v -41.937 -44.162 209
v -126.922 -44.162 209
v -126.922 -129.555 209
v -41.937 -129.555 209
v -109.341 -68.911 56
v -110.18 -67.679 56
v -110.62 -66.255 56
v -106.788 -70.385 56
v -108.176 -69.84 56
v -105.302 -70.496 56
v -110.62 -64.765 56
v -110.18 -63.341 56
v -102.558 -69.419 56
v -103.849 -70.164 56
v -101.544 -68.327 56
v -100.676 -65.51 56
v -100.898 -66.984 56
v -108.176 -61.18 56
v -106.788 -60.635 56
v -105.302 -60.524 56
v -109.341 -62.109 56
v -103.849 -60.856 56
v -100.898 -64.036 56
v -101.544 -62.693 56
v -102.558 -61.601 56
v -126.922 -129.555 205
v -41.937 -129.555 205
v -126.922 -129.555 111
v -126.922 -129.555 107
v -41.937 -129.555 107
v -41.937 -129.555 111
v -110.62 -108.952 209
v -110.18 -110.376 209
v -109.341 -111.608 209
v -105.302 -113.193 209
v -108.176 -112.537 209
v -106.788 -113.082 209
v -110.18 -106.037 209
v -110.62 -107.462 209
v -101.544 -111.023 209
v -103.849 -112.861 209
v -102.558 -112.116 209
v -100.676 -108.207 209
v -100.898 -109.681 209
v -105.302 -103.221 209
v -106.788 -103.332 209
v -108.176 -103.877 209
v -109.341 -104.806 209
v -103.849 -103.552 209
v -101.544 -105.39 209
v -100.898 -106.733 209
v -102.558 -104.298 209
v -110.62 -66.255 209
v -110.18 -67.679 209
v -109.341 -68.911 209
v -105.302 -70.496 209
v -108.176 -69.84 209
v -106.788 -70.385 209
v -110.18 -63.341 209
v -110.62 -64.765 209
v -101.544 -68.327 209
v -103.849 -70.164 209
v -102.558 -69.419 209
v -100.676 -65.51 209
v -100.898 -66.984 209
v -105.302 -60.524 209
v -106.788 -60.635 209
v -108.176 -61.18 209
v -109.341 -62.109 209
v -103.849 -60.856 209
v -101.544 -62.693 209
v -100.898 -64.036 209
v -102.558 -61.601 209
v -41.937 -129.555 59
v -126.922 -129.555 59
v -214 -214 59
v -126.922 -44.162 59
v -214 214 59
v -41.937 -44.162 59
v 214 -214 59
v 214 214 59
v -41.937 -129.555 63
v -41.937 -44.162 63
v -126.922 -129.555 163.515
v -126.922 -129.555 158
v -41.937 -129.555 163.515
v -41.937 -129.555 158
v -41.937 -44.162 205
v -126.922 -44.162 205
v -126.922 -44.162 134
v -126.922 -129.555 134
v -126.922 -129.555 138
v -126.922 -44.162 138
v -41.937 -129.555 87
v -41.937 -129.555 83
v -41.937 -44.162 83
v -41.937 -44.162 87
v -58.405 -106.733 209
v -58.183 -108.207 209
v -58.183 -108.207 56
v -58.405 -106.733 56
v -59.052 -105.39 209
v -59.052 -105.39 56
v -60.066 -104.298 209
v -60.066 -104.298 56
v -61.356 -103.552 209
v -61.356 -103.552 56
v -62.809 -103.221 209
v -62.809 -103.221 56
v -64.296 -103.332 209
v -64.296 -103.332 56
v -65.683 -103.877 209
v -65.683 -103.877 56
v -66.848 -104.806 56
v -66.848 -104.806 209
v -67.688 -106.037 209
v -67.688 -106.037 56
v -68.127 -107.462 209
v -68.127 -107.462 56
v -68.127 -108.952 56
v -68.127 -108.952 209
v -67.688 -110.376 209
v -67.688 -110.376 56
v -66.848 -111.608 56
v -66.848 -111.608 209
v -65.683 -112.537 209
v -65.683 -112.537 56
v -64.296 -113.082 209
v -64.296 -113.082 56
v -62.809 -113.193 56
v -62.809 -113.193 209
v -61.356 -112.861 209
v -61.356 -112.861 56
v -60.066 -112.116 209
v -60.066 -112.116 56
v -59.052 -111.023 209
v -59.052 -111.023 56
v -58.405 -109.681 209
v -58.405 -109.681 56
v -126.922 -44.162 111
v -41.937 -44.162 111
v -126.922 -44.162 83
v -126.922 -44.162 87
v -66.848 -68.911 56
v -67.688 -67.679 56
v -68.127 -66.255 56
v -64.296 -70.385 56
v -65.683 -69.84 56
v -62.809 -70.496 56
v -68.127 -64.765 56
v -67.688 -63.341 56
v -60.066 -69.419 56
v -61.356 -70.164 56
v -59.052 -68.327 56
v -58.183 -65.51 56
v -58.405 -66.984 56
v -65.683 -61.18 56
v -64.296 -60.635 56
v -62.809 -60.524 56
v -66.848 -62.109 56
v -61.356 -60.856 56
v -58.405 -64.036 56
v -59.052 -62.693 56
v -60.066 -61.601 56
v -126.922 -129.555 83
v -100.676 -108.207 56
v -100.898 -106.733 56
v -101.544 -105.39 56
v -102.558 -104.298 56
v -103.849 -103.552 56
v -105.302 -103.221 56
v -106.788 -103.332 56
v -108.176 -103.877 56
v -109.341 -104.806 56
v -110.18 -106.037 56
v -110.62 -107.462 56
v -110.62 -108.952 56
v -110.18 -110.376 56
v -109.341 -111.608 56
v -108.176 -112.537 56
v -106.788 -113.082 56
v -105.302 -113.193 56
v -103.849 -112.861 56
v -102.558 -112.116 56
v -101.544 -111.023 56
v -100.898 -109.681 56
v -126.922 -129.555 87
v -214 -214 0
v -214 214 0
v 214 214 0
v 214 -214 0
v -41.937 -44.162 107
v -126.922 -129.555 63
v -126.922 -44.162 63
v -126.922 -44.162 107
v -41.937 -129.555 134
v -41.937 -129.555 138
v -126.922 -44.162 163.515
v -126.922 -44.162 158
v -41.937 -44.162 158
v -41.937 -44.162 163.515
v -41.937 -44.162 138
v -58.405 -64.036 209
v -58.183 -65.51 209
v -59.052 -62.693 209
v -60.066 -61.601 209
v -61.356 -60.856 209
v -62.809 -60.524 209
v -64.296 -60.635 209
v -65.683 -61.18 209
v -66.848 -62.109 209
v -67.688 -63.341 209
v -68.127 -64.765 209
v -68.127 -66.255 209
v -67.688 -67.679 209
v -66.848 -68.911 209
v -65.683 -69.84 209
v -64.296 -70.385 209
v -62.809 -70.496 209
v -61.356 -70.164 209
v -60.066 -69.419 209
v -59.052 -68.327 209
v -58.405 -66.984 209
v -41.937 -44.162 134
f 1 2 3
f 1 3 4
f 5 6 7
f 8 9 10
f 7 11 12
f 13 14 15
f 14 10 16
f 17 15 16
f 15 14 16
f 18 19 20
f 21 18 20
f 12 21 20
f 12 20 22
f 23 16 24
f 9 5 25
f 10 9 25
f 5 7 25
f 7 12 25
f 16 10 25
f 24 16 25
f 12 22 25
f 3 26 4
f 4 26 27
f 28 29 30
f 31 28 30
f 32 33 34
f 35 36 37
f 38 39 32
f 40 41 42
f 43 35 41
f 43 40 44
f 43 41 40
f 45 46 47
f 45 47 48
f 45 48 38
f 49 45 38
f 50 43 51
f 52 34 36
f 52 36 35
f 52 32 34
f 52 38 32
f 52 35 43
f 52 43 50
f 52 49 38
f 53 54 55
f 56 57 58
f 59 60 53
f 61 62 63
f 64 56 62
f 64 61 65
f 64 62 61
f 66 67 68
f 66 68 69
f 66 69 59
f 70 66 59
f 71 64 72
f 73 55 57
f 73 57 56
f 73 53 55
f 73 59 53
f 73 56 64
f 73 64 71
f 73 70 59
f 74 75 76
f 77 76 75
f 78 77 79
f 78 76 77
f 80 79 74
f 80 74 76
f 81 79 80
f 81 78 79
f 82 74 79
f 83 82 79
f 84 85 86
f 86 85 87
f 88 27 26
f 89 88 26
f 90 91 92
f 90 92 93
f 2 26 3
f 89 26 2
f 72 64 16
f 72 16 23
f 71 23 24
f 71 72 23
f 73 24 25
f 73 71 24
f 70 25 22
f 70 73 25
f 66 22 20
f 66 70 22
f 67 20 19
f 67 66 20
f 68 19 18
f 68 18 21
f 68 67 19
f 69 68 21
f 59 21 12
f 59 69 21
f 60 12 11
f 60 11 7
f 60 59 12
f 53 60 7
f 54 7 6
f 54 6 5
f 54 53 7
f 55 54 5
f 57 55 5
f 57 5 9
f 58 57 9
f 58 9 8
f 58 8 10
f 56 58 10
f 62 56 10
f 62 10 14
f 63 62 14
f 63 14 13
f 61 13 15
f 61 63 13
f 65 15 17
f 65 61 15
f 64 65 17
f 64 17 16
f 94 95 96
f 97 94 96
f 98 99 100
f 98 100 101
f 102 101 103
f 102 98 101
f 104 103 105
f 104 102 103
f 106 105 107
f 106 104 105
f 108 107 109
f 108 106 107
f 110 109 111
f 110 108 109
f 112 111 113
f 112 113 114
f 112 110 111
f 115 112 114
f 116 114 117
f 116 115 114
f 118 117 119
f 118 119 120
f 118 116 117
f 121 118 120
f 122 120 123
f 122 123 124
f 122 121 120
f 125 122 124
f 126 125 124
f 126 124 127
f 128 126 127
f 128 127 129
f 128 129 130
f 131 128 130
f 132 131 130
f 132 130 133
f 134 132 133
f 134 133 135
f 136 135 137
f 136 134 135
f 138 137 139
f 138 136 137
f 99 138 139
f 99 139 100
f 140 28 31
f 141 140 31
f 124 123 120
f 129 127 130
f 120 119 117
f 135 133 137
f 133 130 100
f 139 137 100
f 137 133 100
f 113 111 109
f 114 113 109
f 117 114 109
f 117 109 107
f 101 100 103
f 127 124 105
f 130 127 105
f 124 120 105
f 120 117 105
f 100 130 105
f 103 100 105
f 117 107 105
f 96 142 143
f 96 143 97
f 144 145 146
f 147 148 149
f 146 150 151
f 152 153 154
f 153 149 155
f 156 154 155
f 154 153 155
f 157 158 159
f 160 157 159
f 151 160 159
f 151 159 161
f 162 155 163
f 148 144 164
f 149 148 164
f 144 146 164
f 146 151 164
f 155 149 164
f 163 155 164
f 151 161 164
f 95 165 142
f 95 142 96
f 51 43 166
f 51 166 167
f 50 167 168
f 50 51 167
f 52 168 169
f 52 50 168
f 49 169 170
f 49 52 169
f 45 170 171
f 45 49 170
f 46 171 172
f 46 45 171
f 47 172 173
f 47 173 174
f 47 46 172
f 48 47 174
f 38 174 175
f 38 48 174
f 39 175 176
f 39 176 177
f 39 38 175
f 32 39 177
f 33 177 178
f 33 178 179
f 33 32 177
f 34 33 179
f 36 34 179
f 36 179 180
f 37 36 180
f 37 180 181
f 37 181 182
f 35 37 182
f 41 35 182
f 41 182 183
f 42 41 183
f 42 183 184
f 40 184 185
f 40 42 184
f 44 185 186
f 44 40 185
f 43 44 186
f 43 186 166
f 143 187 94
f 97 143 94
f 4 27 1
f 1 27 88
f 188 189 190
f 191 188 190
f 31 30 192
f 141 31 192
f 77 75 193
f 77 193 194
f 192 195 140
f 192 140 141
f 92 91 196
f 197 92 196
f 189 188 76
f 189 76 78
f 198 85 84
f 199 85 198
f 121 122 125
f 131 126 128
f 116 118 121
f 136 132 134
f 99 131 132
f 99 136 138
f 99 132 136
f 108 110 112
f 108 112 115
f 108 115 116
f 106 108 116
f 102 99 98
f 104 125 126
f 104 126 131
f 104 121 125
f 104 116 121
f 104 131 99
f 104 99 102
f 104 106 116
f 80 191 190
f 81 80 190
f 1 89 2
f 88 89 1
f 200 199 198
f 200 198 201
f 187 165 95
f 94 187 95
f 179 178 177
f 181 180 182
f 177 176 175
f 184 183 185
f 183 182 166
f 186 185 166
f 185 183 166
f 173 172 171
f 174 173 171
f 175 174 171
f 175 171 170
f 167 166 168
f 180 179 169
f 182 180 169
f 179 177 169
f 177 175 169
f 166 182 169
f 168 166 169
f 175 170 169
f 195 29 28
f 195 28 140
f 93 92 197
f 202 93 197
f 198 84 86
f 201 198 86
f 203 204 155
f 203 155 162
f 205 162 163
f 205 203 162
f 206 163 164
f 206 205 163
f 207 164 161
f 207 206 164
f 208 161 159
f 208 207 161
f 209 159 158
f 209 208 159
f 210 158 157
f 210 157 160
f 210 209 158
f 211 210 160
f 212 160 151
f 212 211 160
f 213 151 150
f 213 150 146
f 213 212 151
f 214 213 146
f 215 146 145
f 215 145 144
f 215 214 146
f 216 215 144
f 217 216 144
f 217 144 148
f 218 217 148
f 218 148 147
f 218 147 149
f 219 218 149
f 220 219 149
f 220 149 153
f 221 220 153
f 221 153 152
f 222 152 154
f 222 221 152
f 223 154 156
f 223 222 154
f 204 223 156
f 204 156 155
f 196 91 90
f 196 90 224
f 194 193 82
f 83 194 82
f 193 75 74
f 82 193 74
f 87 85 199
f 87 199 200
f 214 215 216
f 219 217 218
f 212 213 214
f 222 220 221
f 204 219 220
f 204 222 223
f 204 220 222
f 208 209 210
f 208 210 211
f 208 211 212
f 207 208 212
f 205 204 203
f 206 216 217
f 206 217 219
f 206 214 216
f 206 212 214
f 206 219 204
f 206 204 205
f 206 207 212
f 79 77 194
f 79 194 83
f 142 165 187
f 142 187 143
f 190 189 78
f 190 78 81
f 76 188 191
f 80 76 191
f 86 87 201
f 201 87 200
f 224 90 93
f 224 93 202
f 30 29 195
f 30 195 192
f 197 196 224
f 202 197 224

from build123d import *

# Parameters (mm, degrees)
F0_W     = 428
F0_H     = 428
F1_DEPTH = 59
F2_W     = 84.9850364029
F2_H     = 85.393615067
F3_DEPTH = 150
F5_W     = 84.9850364029
F5_H     = 20
F5_H_2   = 23
F6_DEPTH = 100
F4_R     = 5
F7_DEPTH = 153


with BuildPart() as f1:
    # F0 (on Top) → F1 (new body)
    with BuildSketch(Plane.XY):
        Rectangle(F0_W, F0_H)
    extrude(amount=F1_DEPTH)

    # F2 (on face) → F3 (join)
    with BuildSketch(Plane.XY.offset(59)):
        with Locations((-84.4293590635, -86.8584625423)):
            Rectangle(F2_W, F2_H)
    extrude(amount=F3_DEPTH)

    # F5 (on face) → F6 (cut)
    with BuildSketch(Plane.XZ.offset(129.5552700758)):
        with Locations((-84.4293590635, 73)):
            Rectangle(F5_W, F5_H)
        with Locations((-84.4293590635, 97)):
            Rectangle(F5_W, F5_H)
        with Locations((-84.4293590635, 122.5)):
            Rectangle(F5_W, F5_H_2)
        with Locations((-84.4293590635, 148)):
            Rectangle(F5_W, F5_H)
        Polygon((-126.921877265, 205), (-126.921877265, 163.5154783726), (-124.7830837965, 163.5154783726), (-41.936840862, 163.5154783726), (-41.936840862, 205), align=None)
    extrude(amount=-F6_DEPTH, mode=Mode.SUBTRACT)


with BuildPart() as f7:
    # F4 (on face) → F7 (new body)
    with BuildSketch(Plane.XY.offset(209)):
        with Locations((-105.6756181642, -65.5100587755)):
            Circle(F4_R)
    extrude(amount=-F7_DEPTH)


with BuildPart() as f7b:
    # F4 (on face) → F7, piece 2 (new body)
    with BuildSketch(Plane.XY.offset(209)):
        with Locations((-105.6756181642, -108.206866309)):
            Circle(F4_R)
    extrude(amount=-F7_DEPTH)


with BuildPart() as f7c:
    # F4 (on face) → F7, piece 3 (new body)
    with BuildSketch(Plane.XY.offset(209)):
        with Locations((-63.1830999628, -108.206866309)):
            Circle(F4_R)
    extrude(amount=-F7_DEPTH)


with BuildPart() as f7d:
    # F4 (on face) → F7, piece 4 (new body)
    with BuildSketch(Plane.XY.offset(209)):
        with Locations((-63.1830999628, -65.5100587755)):
            Circle(F4_R)
    extrude(amount=-F7_DEPTH)


solid = Compound([f1.part, f7.part, f7b.part, f7c.part, f7d.part])
